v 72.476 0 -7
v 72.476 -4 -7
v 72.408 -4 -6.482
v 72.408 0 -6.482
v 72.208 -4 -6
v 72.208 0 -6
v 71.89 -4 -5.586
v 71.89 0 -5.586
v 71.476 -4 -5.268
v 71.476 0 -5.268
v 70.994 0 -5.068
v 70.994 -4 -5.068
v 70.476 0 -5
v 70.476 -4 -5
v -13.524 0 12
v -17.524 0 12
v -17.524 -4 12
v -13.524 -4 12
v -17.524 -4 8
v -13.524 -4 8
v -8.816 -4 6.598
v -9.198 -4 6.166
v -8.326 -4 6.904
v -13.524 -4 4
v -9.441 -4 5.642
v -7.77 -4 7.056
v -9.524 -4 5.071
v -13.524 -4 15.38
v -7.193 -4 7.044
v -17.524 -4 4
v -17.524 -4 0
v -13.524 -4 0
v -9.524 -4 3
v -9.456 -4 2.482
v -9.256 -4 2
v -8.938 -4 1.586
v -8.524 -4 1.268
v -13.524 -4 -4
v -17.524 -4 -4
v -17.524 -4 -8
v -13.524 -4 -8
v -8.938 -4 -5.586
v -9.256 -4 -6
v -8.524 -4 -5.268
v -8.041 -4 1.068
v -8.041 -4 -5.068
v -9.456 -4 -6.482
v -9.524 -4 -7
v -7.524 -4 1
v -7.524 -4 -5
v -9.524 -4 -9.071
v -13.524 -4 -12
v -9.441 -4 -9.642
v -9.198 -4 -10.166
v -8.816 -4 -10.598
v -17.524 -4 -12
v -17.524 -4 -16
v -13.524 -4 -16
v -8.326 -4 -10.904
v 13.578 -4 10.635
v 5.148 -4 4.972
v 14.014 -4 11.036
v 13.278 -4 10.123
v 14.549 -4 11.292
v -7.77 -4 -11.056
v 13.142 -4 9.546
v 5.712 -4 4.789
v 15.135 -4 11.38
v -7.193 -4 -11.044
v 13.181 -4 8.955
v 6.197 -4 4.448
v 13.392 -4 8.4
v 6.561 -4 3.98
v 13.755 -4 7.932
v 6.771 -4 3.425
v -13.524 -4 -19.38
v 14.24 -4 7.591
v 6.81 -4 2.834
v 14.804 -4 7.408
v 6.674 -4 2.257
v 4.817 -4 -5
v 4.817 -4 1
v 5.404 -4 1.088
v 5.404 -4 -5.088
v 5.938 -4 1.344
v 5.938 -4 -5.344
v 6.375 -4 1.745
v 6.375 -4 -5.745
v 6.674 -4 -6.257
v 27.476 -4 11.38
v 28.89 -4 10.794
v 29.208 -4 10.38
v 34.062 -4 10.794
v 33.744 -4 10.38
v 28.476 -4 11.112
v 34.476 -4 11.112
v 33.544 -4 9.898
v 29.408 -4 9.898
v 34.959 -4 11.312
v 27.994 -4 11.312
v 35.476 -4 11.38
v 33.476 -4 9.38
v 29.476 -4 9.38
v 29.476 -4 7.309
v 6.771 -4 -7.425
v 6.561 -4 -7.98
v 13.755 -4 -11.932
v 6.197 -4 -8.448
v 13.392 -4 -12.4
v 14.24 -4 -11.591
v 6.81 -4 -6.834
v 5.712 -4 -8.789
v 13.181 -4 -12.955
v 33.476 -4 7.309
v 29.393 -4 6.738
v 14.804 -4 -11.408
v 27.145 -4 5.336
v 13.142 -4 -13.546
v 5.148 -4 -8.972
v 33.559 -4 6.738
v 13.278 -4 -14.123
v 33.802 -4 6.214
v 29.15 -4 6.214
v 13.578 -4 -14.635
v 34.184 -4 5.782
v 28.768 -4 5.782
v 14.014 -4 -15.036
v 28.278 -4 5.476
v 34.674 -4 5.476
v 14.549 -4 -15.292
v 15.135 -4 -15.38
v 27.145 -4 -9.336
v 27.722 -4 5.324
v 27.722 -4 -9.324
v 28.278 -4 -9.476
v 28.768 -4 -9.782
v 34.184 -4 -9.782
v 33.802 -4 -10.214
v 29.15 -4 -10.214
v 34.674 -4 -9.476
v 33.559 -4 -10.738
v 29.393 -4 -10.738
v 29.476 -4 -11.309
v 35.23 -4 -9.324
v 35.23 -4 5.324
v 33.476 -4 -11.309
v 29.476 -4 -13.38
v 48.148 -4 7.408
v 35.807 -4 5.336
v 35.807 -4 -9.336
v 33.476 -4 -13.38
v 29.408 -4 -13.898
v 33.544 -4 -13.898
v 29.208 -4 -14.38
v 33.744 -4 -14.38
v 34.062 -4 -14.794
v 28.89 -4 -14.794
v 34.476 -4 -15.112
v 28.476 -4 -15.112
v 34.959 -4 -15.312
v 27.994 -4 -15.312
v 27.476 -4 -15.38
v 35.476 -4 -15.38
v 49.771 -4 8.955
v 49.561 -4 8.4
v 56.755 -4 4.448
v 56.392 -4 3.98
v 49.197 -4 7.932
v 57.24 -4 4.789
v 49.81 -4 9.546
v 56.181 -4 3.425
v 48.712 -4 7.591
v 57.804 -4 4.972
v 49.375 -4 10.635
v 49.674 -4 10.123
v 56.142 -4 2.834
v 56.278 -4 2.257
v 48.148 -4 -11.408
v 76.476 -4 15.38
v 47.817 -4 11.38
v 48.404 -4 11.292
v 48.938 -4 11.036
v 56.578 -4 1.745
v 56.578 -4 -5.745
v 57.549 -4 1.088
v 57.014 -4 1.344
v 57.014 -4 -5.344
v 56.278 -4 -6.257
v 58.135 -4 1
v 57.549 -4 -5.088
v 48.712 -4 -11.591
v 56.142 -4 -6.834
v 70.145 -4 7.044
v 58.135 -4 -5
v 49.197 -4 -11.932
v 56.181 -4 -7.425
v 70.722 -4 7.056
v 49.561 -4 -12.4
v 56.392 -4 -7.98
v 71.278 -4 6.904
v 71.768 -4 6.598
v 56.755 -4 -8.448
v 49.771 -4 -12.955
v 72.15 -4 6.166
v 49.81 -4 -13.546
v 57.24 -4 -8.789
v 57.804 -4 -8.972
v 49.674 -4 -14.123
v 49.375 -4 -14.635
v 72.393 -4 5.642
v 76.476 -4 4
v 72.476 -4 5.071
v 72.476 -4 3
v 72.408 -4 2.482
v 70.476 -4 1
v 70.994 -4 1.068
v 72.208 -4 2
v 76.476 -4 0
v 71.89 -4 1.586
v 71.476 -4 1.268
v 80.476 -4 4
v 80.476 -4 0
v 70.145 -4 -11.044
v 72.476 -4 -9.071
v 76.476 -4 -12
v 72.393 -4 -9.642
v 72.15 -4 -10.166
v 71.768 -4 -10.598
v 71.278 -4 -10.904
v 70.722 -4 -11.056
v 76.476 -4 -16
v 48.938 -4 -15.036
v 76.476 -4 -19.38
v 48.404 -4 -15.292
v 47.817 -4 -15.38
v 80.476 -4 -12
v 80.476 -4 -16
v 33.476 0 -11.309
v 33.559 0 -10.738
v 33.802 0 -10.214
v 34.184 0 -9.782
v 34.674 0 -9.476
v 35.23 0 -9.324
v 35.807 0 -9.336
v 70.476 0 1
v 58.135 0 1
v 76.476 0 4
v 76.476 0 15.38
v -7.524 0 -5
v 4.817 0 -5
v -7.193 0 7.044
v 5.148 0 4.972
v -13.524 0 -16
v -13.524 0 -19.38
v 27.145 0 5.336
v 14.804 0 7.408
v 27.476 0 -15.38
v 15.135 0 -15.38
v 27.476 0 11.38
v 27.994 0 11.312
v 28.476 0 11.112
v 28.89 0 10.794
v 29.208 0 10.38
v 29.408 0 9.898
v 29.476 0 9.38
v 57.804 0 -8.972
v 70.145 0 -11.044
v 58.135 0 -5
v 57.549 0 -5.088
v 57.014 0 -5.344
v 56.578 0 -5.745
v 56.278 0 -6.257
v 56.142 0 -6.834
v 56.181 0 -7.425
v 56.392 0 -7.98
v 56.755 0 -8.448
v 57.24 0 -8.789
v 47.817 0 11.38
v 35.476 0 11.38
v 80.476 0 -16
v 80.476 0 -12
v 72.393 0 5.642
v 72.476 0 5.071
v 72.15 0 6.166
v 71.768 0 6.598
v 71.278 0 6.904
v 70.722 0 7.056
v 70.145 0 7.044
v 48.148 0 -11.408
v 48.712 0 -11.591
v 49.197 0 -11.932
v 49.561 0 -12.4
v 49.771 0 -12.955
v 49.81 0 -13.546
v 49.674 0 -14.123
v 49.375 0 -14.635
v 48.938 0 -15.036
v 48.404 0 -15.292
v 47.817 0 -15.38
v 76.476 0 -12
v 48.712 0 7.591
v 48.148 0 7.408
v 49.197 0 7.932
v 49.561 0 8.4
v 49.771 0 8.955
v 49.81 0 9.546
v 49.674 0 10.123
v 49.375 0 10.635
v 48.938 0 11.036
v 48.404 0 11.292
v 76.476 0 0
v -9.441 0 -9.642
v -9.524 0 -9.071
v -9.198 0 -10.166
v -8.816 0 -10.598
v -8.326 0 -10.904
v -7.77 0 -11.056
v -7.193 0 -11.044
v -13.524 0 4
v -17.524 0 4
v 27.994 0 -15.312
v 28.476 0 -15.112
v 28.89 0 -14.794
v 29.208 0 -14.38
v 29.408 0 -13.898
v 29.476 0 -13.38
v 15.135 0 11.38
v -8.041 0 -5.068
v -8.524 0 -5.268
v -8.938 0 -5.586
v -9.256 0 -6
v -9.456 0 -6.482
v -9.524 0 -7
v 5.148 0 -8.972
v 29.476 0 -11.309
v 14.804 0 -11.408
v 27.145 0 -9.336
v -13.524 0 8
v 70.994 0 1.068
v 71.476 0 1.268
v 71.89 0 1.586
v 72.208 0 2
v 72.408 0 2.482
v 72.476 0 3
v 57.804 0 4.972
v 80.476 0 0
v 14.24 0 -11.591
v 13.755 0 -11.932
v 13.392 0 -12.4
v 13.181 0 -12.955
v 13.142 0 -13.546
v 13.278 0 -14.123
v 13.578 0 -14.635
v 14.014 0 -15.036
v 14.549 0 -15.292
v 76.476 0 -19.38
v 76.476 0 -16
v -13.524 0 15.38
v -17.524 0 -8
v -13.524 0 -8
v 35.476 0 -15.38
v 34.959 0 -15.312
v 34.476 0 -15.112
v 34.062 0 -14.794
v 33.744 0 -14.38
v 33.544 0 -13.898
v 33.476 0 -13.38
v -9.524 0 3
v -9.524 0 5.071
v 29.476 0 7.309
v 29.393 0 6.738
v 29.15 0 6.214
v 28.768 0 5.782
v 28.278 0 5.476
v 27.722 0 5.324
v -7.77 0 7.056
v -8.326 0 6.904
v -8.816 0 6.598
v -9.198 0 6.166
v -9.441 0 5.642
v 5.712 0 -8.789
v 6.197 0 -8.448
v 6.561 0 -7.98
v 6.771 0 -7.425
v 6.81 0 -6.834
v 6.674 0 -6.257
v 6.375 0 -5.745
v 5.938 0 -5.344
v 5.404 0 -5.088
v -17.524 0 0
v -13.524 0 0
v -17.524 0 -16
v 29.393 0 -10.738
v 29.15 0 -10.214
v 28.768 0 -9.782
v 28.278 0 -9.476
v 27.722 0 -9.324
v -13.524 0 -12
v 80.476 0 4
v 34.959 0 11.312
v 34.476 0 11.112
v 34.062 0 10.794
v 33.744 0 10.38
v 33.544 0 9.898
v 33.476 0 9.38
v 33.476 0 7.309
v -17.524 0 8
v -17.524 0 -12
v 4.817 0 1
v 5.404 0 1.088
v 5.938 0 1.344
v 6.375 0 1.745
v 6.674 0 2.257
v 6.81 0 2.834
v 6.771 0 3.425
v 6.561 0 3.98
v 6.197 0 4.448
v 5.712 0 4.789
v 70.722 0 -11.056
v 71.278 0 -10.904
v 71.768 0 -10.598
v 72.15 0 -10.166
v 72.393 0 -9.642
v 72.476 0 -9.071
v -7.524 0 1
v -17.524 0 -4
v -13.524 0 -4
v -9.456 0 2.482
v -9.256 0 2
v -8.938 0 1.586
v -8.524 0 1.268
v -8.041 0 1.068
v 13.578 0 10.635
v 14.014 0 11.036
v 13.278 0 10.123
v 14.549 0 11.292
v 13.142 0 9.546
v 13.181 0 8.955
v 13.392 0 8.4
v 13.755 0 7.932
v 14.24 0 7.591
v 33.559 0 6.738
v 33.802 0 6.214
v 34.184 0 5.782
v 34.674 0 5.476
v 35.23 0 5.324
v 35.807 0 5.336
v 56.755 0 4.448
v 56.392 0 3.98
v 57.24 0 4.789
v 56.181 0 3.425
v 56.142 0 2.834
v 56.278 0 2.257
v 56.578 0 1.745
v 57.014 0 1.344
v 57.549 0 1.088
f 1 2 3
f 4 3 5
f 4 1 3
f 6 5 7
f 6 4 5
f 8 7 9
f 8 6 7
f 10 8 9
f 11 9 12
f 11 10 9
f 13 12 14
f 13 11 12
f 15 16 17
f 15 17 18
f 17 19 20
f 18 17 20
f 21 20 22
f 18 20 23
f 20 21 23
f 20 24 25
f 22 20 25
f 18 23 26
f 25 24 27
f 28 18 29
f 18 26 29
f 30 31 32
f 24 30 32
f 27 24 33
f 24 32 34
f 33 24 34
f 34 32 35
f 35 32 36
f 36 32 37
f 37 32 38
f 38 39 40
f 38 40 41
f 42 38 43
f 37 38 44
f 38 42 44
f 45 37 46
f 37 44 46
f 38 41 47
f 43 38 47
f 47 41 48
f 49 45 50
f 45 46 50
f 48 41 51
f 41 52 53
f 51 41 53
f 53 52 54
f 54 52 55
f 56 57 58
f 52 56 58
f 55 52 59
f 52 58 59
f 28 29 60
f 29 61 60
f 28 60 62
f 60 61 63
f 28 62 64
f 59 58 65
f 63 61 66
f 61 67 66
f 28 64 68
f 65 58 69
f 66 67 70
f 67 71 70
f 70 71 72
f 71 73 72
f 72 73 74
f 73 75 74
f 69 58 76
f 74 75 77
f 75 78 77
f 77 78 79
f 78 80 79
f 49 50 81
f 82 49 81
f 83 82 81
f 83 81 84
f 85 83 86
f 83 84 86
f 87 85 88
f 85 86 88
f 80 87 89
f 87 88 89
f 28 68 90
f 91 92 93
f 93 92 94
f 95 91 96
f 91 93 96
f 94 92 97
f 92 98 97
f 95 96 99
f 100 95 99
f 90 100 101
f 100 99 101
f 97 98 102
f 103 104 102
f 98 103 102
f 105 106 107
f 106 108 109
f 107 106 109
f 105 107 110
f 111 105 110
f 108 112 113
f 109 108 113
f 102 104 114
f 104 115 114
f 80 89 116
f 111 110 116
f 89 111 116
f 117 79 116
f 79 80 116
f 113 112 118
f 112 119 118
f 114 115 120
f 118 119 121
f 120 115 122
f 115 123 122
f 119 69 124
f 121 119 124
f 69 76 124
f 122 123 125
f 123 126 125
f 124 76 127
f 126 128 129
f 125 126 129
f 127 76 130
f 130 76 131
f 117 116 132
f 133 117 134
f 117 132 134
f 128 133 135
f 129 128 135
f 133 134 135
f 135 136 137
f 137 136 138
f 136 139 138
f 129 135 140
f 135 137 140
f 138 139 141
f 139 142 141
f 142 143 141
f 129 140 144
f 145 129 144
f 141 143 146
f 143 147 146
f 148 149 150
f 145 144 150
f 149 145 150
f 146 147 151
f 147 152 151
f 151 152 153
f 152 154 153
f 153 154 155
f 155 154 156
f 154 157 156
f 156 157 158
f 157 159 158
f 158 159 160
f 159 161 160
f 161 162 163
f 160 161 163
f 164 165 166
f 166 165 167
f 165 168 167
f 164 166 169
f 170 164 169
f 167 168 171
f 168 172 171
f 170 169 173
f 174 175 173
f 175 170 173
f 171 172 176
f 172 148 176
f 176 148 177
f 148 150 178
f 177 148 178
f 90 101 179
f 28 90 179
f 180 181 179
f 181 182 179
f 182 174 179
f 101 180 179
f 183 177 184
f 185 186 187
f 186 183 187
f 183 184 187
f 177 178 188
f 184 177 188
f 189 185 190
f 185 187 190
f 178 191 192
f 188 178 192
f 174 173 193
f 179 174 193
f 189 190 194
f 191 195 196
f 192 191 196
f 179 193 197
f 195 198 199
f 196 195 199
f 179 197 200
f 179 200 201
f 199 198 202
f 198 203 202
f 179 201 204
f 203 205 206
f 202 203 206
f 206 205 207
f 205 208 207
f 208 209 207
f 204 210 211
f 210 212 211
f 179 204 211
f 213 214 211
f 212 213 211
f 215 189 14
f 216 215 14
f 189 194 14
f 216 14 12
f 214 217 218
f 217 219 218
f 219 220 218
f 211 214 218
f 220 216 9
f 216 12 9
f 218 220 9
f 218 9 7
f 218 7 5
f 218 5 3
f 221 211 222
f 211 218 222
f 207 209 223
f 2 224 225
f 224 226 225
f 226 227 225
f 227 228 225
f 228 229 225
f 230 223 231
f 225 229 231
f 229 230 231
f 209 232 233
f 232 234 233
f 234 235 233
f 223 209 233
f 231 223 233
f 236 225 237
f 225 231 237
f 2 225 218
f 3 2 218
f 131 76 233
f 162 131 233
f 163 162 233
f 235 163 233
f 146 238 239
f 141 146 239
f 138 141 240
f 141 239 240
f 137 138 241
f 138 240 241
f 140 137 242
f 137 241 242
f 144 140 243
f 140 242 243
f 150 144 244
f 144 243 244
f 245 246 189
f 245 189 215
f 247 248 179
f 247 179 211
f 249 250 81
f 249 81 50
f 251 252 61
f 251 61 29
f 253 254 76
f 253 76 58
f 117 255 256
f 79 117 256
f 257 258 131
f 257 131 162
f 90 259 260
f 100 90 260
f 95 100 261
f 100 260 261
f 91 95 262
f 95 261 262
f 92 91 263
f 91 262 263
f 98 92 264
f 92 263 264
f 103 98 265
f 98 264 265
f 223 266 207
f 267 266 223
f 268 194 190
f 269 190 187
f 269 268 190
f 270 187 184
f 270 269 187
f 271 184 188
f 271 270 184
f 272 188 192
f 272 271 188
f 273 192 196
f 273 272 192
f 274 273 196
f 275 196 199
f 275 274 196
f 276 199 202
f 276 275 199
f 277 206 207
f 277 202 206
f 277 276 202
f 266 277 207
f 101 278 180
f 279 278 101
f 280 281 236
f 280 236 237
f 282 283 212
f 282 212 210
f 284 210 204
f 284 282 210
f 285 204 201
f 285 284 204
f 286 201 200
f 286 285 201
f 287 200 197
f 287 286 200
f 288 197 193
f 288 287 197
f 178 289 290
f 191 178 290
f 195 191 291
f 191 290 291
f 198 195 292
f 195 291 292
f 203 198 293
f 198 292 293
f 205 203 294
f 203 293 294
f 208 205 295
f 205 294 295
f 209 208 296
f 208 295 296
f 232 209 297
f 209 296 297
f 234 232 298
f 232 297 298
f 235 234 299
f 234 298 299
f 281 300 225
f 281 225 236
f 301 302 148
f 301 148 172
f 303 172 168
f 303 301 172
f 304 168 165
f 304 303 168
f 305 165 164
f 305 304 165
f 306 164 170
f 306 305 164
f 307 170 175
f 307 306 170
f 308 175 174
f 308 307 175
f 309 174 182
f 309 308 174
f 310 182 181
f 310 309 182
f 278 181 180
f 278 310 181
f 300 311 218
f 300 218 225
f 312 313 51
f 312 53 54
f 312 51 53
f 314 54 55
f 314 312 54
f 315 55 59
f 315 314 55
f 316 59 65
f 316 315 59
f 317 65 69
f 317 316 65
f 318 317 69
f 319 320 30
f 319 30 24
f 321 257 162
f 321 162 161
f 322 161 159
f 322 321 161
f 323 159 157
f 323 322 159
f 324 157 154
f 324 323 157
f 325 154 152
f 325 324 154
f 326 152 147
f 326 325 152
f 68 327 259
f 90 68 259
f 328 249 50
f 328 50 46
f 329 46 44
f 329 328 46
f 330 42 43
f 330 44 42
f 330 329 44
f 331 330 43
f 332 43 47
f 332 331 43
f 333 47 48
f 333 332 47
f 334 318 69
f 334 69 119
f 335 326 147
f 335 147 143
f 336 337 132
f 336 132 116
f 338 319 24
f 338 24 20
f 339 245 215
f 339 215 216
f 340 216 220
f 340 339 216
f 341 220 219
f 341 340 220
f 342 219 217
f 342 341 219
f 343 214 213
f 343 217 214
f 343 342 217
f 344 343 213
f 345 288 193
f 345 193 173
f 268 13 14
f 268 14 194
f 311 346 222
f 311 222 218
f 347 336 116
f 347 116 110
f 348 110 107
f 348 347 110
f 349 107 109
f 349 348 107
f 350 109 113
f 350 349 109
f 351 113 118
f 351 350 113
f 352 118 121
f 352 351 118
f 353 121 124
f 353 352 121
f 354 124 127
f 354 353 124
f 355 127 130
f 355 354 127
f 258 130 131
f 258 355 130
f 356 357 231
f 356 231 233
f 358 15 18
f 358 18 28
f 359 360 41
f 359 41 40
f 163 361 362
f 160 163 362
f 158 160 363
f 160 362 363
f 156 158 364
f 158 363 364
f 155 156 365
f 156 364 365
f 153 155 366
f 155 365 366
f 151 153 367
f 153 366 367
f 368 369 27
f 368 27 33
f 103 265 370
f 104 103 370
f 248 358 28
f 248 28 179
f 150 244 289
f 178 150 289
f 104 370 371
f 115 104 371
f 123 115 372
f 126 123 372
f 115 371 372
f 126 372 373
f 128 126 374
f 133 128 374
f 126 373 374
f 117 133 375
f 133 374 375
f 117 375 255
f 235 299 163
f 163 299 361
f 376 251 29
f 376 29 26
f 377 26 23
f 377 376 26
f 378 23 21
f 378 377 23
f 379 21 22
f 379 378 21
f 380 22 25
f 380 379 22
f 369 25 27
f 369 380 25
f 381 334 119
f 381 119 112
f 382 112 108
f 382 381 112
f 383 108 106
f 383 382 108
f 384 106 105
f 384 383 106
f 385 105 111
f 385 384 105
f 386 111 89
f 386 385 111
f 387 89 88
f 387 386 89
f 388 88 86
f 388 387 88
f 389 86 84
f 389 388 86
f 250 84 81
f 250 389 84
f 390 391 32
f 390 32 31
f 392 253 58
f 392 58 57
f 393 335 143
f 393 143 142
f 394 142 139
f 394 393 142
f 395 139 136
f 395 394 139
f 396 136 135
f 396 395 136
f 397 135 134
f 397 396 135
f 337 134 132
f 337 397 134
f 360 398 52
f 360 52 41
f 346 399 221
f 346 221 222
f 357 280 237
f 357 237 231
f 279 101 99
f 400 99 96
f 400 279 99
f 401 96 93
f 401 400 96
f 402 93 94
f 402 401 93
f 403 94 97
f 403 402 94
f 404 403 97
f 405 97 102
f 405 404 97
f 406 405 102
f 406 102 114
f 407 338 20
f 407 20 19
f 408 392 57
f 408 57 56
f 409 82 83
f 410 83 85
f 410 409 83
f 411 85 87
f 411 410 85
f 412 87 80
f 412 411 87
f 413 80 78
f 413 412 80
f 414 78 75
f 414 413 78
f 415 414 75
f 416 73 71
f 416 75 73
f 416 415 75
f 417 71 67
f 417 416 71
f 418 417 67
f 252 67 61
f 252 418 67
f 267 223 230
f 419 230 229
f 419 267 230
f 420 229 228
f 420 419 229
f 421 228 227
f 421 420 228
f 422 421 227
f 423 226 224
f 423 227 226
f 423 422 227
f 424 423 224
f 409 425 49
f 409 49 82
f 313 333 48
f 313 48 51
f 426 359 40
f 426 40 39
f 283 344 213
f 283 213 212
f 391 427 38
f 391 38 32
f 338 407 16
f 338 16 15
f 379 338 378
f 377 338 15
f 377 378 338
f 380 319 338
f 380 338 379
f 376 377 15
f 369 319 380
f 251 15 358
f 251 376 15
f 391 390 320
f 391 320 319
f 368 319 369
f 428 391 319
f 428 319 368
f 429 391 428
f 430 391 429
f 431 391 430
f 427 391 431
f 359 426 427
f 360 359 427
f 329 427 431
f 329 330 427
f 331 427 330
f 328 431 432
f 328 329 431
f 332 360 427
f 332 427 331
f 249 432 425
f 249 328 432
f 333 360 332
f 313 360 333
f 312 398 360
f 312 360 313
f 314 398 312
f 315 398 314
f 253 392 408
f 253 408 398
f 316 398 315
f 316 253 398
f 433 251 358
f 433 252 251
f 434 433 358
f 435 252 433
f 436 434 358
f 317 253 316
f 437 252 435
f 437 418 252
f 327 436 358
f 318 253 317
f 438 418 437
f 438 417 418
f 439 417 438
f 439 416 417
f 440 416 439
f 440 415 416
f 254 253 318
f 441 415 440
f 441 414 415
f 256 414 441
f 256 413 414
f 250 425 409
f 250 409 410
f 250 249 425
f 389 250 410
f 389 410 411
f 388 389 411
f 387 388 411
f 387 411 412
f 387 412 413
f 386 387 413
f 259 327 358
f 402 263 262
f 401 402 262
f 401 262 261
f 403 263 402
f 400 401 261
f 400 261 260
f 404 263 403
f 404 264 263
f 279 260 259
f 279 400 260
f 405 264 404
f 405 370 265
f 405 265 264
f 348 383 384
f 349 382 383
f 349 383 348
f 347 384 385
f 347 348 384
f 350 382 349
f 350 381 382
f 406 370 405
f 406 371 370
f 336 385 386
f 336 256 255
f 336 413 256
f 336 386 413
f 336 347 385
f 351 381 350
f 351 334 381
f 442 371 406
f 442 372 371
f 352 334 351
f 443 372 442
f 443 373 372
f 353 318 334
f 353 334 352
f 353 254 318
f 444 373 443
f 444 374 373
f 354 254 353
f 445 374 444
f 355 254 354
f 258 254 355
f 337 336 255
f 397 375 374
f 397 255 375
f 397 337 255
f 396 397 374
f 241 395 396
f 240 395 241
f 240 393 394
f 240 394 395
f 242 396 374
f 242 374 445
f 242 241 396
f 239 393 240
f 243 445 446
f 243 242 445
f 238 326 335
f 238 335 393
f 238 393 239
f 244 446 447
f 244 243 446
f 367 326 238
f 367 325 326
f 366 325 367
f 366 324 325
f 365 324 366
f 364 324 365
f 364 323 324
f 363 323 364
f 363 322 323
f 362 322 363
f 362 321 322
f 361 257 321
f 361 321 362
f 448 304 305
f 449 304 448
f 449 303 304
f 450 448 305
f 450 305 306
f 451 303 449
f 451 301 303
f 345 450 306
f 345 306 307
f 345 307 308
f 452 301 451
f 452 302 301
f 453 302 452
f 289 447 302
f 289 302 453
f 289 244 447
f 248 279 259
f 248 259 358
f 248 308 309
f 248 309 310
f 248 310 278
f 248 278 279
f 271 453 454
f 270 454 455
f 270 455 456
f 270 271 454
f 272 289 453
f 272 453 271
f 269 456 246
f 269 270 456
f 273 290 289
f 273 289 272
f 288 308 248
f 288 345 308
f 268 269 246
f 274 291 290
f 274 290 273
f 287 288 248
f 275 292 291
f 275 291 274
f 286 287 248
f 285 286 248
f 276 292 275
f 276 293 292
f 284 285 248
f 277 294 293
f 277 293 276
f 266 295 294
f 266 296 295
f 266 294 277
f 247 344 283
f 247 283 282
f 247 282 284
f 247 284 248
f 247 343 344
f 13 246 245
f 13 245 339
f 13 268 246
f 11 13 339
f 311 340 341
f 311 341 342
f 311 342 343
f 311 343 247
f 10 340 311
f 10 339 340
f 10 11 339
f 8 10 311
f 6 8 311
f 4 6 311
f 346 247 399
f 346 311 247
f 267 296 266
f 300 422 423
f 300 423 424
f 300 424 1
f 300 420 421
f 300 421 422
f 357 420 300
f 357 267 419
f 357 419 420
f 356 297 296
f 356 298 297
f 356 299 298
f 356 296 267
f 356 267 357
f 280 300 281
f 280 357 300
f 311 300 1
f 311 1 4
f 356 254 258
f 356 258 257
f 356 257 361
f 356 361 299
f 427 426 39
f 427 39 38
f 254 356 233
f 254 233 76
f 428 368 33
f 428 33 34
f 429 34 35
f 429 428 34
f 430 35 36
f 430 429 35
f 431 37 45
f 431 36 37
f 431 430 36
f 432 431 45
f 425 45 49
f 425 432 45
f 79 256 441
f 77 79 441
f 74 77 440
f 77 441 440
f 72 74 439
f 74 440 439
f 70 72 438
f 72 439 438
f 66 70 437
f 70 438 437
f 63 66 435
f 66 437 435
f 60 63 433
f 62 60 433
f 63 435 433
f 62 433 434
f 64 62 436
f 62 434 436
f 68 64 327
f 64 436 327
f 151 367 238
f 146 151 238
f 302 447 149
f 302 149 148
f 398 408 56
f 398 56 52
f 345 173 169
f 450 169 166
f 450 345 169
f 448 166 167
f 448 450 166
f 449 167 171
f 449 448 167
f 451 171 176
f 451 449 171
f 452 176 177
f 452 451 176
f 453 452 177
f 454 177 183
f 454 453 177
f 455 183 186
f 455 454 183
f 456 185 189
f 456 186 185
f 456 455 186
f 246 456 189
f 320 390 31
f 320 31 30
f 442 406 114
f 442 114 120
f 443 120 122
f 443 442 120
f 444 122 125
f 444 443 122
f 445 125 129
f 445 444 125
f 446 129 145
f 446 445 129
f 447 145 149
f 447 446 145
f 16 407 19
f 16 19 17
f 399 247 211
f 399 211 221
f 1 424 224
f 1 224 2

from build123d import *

# Parameters (mm, degrees)
BOSS_EXTRUDE1_DEPTH = 4
CUT_EXTRUDE1_DEPTH  = 10


with BuildPart() as part:
    # Sketch1 → Boss-Extrude1 (new body)
    with BuildSketch(Plane(origin=(0, 0, 0), x_dir=(1, 0, 0), z_dir=(0, 1, 0))):
        Polygon((-13.523809524, 16), (-17.523809524, 16), (-17.523809524, 12), (-13.523809524, 12), (-13.523809524, 8), (-17.523809524, 8), (-17.523809524, 4), (-13.523809524, 4), (-13.523809524, 0), (-17.523809524, 0), (-17.523809524, -4), (-13.523809524, -4), (-13.523809524, -8), (-17.523809524, -8), (-17.523809524, -12), (-13.523809524, -12), (-13.523809524, -15.38), (76.476190476, -15.38), (76.476190476, -4), (80.476190476, -4), (80.476190476, 0), (76.476190476, 0), (76.476190476, 12), (80.476190476, 12), (80.476190476, 16), (76.476190476, 16), (76.476190476, 19.38), (-13.523809524, 19.38), align=None)
    extrude(amount=-BOSS_EXTRUDE1_DEPTH)

    # Sketch2 → Cut-Extrude1 (cut)
    with BuildSketch(Plane(origin=(0, 0, 0), x_dir=(1, 0, 0), z_dir=(0, 1, 0))):
        with BuildLine():
            ThreePointArc((-9.523809524, 9.071498058), (-8.815677287, 10.598284776), (-7.192731841, 11.0439046))
            Line((-7.192731841, 11.0439046), (5.148288204, 8.972406542))
            ThreePointArc((5.148288204, 8.972406542), (6.810300218, 6.833887214), (4.817210521, 5))
            Line((4.817210521, 5), (-7.523809524, 5))
            ThreePointArc((-7.523809524, 5), (-8.938023086, 5.585786438), (-9.523809524, 7))
            Line((-9.523809524, 7), (-9.523809524, 9.071498058))
        make_face()
        with BuildLine():
            Line((15.135170432, 15.38), (27.476190476, 15.38))
            ThreePointArc((27.476190476, 15.38), (28.890404039, 14.794213562), (29.476190476, 13.38))
            Line((29.476190476, 13.38), (29.476190476, 11.308501942))
            ThreePointArc((29.476190476, 11.308501942), (28.768058239, 9.781715224), (27.145112793, 9.3360954))
            Line((27.145112793, 9.3360954), (14.804092749, 11.407593458))
            ThreePointArc((14.804092749, 11.407593458), (13.142080734, 13.546112786), (15.135170432, 15.38))
        make_face()
        with BuildLine():
            Line((33.476190476, 13.38), (33.476190476, 11.308501942))
            ThreePointArc((33.476190476, 11.308501942), (34.184322713, 9.781715224), (35.807268159, 9.3360954))
            Line((35.807268159, 9.3360954), (48.148288204, 11.407593458))
            ThreePointArc((48.148288204, 11.407593458), (49.810300218, 13.546112786), (47.817210521, 15.38))
            Line((47.817210521, 15.38), (35.476190476, 15.38))
            ThreePointArc((35.476190476, 15.38), (34.061976914, 14.794213562), (33.476190476, 13.38))
        make_face()
        with BuildLine():
            ThreePointArc((72.476190476, 7), (71.890404039, 5.585786438), (70.476190476, 5))
            Line((70.476190476, 5), (58.135170432, 5))
            ThreePointArc((58.135170432, 5), (56.142080734, 6.833887214), (57.804092749, 8.972406542))
            Line((57.804092749, 8.972406542), (70.145112793, 11.0439046))
            ThreePointArc((70.145112793, 11.0439046), (71.768058239, 10.598284776), (72.476190476, 9.071498058))
            Line((72.476190476, 9.071498058), (72.476190476, 7))
        make_face()
        with BuildLine():
            ThreePointArc((72.476190476, -5.071498058), (71.768058239, -6.598284776), (70.145112793, -7.0439046))
            Line((70.145112793, -7.0439046), (57.804092749, -4.972406542))
            ThreePointArc((57.804092749, -4.972406542), (56.142080734, -2.833887214), (58.135170432, -1))
            Line((58.135170432, -1), (70.476190476, -1))
            ThreePointArc((70.476190476, -1), (71.890404039, -1.585786438), (72.476190476, -3))
            Line((72.476190476, -3), (72.476190476, -5.071498058))
        make_face()
        with BuildLine():
            Line((47.817210521, -11.38), (35.476190476, -11.38))
            ThreePointArc((35.476190476, -11.38), (34.061976914, -10.794213562), (33.476190476, -9.38))
            Line((33.476190476, -9.38), (33.476190476, -7.308501942))
            ThreePointArc((33.476190476, -7.308501942), (34.184322713, -5.781715224), (35.807268159, -5.3360954))
            Line((35.807268159, -5.3360954), (48.148288204, -7.407593458))
            ThreePointArc((48.148288204, -7.407593458), (49.810300218, -9.546112786), (47.817210521, -11.38))
        make_face()
        with BuildLine():
            Line((29.476190476, -9.38), (29.476190476, -7.308501942))
            ThreePointArc((29.476190476, -7.308501942), (28.768058239, -5.781715224), (27.145112793, -5.3360954))
            Line((27.145112793, -5.3360954), (14.804092749, -7.407593458))
            ThreePointArc((14.804092749, -7.407593458), (13.142080734, -9.546112786), (15.135170432, -11.38))
            Line((15.135170432, -11.38), (27.476190476, -11.38))
            ThreePointArc((27.476190476, -11.38), (28.890404039, -10.794213562), (29.476190476, -9.38))
        make_face()
        with BuildLine():
            ThreePointArc((-9.523809524, -3), (-8.938023086, -1.585786438), (-7.523809524, -1))
            Line((-7.523809524, -1), (4.817210521, -1))
            ThreePointArc((4.817210521, -1), (6.810300218, -2.833887214), (5.148288204, -4.972406542))
            Line((5.148288204, -4.972406542), (-7.192731841, -7.0439046))
            ThreePointArc((-7.192731841, -7.0439046), (-8.815677287, -6.598284776), (-9.523809524, -5.071498058))
            Line((-9.523809524, -5.071498058), (-9.523809524, -3))
        make_face()
    extrude(amount=-CUT_EXTRUDE1_DEPTH, mode=Mode.SUBTRACT)


solid = part.part
